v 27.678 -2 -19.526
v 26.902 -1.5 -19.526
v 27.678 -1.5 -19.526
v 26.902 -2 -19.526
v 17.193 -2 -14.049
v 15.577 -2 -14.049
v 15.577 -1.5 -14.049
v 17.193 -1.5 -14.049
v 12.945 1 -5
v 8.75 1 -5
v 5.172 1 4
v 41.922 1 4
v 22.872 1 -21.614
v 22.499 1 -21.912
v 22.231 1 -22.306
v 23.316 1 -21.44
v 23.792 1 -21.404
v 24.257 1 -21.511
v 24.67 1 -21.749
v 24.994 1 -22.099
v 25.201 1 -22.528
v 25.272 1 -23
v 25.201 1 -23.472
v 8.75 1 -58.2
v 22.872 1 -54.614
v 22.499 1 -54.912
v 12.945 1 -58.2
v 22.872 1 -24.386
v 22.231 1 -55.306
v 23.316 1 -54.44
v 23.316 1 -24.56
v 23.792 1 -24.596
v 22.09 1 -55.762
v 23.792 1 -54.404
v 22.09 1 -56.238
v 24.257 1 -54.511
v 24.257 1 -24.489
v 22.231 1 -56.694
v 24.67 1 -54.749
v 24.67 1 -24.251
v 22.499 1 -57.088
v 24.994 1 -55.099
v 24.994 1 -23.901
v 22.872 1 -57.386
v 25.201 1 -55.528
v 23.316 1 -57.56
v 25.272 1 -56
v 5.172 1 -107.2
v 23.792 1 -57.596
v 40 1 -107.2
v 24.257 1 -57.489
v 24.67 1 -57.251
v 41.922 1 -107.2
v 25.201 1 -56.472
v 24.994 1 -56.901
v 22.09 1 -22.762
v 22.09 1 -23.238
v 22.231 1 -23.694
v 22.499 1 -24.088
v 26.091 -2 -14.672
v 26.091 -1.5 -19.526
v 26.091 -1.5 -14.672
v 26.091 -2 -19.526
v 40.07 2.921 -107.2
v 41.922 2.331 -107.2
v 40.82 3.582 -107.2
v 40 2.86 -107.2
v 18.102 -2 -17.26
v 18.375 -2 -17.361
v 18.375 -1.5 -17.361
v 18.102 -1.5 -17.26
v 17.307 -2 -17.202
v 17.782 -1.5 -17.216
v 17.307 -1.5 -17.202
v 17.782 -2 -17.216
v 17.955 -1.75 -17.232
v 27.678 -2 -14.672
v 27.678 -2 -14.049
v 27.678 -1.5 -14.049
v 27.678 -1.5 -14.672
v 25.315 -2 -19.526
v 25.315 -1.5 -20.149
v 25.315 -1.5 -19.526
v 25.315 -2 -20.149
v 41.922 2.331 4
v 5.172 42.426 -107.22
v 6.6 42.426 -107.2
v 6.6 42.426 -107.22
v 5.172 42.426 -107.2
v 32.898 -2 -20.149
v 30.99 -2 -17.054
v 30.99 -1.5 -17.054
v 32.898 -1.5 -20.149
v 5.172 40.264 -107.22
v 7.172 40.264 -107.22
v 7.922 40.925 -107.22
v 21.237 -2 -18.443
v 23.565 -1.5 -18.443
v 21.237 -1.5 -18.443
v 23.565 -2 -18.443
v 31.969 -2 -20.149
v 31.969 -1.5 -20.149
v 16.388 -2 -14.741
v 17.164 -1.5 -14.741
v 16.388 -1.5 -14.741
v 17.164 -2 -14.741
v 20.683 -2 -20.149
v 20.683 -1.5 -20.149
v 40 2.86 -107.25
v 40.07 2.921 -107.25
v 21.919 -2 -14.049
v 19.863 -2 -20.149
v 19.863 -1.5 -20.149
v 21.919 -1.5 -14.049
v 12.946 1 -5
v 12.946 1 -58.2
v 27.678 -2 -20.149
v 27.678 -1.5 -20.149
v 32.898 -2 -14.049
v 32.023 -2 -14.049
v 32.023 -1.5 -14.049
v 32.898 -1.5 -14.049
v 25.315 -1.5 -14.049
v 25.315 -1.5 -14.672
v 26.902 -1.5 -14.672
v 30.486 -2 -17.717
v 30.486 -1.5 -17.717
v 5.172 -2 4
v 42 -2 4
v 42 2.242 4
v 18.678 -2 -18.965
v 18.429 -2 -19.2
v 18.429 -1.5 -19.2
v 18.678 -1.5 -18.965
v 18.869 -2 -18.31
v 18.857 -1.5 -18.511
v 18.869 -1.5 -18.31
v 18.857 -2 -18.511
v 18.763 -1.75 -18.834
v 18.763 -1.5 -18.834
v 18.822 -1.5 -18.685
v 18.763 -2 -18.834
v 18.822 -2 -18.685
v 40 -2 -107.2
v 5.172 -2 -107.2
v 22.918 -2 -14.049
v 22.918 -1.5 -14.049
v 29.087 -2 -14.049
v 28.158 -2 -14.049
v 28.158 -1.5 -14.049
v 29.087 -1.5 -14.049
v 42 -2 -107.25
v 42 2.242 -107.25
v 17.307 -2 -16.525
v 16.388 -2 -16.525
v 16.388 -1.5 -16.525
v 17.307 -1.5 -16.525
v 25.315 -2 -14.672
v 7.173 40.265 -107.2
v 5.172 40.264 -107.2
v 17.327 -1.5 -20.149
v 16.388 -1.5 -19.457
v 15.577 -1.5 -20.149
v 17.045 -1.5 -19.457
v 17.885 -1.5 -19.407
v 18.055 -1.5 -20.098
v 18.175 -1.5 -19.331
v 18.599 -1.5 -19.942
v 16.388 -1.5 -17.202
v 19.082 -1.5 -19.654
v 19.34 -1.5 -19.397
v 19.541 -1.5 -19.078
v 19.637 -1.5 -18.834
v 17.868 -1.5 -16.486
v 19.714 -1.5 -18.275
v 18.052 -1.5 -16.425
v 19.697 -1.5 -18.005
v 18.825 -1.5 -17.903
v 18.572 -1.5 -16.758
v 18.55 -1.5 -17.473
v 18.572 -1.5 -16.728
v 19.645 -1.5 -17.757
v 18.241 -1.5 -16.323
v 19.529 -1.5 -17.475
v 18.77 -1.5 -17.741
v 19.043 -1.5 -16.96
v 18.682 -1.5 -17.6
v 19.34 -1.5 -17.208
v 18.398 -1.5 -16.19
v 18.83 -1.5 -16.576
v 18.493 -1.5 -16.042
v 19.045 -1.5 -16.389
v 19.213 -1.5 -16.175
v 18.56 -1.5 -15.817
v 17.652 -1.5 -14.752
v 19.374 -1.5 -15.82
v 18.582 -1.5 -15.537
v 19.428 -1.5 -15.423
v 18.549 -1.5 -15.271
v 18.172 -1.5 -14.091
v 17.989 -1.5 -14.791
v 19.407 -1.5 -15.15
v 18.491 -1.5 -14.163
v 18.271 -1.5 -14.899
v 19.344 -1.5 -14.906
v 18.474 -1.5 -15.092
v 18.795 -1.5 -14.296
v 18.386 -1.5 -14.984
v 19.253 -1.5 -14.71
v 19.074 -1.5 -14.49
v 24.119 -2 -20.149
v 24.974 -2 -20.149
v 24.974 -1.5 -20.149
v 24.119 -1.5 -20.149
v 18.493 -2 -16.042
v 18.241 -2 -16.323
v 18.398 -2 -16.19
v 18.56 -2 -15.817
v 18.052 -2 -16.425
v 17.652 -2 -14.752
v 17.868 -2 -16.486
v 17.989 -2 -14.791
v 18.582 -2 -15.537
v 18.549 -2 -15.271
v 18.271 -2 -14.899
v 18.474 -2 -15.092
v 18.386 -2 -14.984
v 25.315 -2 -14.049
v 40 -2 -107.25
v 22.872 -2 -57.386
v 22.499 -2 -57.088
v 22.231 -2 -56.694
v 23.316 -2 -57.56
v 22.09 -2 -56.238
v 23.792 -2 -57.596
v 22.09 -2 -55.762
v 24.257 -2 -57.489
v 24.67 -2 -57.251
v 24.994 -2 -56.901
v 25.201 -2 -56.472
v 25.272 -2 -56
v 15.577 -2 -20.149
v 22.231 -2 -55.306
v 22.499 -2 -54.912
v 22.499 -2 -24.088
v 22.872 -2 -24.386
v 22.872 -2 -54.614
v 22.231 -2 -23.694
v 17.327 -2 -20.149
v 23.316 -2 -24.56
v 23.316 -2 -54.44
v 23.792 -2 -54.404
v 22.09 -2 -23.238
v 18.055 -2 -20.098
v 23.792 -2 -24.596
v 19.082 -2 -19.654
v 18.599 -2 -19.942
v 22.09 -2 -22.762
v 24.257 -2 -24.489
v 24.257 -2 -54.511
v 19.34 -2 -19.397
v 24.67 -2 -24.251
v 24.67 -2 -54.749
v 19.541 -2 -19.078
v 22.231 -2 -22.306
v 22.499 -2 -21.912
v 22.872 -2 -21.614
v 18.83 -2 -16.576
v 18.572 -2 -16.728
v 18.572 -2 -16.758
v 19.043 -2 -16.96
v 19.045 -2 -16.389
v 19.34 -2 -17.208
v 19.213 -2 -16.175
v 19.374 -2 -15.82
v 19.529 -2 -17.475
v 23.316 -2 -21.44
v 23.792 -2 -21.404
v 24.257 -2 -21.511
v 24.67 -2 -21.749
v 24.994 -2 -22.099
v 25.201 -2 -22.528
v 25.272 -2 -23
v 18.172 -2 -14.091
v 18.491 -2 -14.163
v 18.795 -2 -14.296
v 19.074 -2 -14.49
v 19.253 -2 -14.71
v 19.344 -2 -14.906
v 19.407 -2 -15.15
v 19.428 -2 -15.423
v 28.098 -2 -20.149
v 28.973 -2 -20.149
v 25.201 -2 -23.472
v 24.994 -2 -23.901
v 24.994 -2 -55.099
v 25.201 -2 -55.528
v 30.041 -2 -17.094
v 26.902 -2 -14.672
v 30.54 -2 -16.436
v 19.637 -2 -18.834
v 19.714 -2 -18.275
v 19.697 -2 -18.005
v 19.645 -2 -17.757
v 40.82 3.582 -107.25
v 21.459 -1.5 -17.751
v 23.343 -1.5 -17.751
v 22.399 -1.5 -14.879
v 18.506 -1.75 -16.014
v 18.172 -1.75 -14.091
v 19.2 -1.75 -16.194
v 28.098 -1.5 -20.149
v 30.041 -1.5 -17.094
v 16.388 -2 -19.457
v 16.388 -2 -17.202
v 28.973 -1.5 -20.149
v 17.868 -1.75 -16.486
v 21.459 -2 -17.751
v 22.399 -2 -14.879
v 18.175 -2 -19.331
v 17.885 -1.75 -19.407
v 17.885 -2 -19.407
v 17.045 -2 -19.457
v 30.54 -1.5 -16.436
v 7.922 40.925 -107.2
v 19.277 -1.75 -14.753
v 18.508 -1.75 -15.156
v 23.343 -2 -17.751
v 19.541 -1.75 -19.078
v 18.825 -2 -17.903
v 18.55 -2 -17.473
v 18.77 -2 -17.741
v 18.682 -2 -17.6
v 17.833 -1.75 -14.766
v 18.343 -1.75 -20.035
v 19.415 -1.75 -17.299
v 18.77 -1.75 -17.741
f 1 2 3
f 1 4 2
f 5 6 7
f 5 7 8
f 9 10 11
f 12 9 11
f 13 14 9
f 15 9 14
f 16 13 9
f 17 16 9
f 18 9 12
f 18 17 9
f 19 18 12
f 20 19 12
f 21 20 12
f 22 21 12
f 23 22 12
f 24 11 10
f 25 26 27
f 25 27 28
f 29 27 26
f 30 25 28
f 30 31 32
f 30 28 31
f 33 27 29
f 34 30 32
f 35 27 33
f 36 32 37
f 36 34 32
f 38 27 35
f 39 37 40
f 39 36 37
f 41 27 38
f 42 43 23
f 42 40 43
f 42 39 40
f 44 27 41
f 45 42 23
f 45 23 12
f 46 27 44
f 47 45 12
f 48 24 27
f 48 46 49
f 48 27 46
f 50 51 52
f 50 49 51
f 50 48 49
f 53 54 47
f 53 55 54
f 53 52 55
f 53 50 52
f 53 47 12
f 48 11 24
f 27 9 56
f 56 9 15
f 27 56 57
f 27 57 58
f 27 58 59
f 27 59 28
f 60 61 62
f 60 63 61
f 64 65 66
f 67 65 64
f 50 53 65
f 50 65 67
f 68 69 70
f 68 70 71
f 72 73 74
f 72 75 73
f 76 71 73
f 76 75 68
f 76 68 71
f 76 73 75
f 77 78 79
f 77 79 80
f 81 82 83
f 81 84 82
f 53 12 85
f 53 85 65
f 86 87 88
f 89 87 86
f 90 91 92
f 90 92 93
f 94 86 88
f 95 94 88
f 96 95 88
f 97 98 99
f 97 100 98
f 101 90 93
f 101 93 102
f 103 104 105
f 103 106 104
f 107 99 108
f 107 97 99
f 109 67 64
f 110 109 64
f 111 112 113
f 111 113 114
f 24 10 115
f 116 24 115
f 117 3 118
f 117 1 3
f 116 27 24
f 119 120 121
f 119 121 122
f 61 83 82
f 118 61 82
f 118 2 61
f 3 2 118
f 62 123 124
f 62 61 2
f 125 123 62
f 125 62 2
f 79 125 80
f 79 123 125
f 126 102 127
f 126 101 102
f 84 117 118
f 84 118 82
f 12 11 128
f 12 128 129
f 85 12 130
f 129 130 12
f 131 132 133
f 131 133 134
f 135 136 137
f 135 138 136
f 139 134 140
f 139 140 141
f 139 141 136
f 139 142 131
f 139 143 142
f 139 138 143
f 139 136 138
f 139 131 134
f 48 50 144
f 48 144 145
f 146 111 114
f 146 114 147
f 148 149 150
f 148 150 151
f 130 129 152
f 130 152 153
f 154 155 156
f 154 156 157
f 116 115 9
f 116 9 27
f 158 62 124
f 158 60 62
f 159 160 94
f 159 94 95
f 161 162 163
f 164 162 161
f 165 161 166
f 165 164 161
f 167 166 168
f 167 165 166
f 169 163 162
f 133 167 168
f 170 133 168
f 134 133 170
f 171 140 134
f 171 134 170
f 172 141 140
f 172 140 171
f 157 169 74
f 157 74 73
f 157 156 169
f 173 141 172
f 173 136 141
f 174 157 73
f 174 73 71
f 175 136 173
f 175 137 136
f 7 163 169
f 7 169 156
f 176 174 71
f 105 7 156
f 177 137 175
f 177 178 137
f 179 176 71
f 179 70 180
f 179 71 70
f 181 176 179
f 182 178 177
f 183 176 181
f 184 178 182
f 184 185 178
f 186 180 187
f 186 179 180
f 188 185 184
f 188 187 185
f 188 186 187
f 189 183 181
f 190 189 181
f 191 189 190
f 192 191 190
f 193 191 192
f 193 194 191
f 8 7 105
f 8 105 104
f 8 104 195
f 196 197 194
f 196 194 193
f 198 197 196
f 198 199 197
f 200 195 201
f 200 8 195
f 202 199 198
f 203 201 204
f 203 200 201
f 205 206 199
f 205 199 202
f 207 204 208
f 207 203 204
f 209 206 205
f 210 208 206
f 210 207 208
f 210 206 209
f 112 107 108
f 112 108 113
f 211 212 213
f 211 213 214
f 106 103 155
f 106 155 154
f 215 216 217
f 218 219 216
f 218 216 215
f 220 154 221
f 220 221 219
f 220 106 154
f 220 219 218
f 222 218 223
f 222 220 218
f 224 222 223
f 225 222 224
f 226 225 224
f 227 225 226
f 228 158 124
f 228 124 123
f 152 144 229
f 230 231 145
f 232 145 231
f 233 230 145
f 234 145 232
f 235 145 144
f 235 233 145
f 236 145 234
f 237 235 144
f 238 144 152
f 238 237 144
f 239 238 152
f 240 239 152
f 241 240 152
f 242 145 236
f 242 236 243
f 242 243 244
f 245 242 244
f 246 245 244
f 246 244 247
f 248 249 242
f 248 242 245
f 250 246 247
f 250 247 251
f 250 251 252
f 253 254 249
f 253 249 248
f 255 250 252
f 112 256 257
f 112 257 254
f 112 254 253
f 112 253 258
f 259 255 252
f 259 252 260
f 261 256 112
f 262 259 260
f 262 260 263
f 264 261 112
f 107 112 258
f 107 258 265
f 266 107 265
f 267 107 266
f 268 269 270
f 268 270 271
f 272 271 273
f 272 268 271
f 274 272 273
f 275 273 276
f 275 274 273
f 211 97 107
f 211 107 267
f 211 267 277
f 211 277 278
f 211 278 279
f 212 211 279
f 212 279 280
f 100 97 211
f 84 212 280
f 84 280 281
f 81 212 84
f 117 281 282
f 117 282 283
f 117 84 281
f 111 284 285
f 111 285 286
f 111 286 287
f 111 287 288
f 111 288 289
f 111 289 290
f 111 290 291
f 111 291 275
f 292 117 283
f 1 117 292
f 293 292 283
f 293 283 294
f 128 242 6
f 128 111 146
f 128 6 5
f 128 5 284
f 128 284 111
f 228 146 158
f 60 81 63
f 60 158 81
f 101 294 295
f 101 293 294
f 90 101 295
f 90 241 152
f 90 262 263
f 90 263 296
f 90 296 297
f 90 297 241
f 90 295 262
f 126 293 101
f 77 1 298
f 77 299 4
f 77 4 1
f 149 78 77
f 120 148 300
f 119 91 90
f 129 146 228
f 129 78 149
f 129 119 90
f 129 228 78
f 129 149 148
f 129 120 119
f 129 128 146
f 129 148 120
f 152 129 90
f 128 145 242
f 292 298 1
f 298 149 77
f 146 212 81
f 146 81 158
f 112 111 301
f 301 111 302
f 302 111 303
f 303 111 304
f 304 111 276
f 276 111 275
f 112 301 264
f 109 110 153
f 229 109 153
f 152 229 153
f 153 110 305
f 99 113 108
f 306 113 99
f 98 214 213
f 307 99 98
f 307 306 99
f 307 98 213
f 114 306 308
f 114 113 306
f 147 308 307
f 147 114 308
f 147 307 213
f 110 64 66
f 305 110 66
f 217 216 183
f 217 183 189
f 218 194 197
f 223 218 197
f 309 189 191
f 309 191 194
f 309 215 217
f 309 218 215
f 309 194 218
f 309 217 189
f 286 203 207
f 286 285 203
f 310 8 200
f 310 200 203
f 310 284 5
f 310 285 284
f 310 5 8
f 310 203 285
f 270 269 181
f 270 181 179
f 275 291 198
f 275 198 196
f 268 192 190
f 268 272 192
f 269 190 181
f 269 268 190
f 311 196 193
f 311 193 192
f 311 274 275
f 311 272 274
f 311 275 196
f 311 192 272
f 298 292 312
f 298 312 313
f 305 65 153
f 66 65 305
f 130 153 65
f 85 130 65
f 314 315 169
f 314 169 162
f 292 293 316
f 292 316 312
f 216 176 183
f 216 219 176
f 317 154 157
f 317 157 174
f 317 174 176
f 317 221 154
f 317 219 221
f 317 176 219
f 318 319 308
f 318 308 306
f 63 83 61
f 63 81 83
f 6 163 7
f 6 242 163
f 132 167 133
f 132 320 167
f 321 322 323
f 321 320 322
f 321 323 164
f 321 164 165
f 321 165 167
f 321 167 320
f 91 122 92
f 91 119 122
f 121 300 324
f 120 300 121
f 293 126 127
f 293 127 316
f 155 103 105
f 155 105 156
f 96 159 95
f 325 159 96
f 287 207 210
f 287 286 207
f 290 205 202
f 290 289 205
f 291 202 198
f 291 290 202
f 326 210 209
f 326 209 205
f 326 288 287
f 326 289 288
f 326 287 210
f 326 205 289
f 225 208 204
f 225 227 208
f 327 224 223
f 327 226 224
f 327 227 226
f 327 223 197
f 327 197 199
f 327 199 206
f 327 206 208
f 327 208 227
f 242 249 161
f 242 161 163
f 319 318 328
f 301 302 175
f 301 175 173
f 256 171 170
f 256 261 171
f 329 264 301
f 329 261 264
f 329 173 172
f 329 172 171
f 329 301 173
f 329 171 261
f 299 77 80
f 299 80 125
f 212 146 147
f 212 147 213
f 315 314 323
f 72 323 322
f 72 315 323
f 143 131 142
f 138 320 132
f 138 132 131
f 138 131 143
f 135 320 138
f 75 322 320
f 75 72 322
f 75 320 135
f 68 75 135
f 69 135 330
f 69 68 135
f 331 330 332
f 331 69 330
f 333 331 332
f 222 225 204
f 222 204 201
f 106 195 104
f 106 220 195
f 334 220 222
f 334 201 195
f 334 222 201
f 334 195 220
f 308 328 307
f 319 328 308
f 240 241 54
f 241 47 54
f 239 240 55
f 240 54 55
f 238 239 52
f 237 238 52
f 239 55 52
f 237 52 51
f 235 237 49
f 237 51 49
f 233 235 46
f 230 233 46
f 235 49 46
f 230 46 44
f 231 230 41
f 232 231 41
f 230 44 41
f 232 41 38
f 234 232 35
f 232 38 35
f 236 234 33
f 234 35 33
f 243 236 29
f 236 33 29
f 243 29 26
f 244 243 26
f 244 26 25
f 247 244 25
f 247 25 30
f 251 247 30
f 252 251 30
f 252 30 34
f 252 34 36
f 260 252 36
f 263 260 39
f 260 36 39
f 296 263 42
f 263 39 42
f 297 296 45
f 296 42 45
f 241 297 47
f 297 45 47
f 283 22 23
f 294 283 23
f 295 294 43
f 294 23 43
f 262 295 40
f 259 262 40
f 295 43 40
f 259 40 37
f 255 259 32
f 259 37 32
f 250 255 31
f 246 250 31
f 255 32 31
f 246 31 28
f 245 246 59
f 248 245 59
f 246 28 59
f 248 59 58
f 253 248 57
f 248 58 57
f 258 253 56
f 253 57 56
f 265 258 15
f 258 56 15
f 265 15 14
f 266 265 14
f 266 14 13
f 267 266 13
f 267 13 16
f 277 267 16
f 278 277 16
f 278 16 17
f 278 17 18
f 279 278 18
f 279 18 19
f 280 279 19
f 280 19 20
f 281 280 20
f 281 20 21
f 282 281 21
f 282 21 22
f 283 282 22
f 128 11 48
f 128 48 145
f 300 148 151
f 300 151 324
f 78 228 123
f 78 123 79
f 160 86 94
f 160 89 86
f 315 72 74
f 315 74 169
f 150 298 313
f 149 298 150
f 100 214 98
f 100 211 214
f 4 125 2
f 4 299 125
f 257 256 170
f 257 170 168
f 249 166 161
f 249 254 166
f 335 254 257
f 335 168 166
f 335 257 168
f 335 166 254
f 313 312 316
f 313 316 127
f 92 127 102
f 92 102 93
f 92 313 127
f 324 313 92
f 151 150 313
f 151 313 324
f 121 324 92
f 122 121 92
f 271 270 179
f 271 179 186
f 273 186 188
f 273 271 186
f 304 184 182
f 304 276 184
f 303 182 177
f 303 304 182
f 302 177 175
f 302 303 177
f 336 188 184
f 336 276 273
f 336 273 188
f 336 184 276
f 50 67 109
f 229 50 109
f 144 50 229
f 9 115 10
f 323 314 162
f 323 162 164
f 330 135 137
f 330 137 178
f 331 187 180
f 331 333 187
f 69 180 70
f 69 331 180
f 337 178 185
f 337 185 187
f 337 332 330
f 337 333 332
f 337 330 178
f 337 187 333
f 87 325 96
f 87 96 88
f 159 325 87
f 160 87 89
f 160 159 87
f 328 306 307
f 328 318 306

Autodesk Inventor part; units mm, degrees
ref_plane "YZ Plane" through (0, 0, 0) normal (1, 0, 0) x (0, 1, 0)
ref_plane "XZ Plane" through (0, 0, 0) normal (0, 1, 0) x (-1, 0, 0)
ref_plane "XY Plane" through (0, 0, 0) normal (0, 0, 1) x (1, 0, 0)
sketch "Boceto3" plane through (0, 0, 0) normal (0, 0, 1) x (1, 0, 0)
  line L0 (40, 0) -> (37, 0)
  line L1 (0, 0) -> (0, 45)
  line L2 (0, 45) -> (3, 45)
  line L3 (40, 0) -> (40, 3)
  line L4 (40, 3) -> (3, 45)
  line L5 (0, 0) -> (40, 0)
  dimension "d3" = 3
  dimension "d4" = 45
  dimension "d5" = 3
  dimension "d6" = 3
extrude "Extrusión1" add sketch "Boceto3" against normal blind 98.2
sketch "Boceto4" plane through (0, 0, 0) normal (0, 0, 1) x (1, 0, 0)
  line L0 (3.3154, 41.6201) -> (2, 43)
  line L1 (3.3154, 41.6201) -> (38, 2)
  line L2 (38, 2) -> (2, 2)
  line L3 (2, 2) -> (2, 43)
  point P0 (0, 45)
extrude "Extrusión2" cut sketch "Boceto4" against normal blind 210.55
sketch "Boceto6" plane through (0, 0, 0) normal (0, 0, 1) x (1, 0, 0)
  line L0 (1.0395, 0.9992) -> (39.0395, 0.9992)
  line L1 (39.0395, 1.0003) -> (39.0395, 1.9993) projected
  line L2 (39.0395, 0.9992) -> (39.0395, 1.9993)
  line L3 (39.0395, 1.9993) -> (3, 44.0003)
  line L4 (2.88, 44.0003) -> (1, 44.0003) projected
  line L5 (3, 44.0003) -> (1, 44.0003)
  line L6 (1, 1.0003) -> (39.0395, 1.0003) projected
  line L7 (1, 44.0003) -> (1, 1.0003)
  point P0 (0, 0)
extrude "Extrusión3" add sketch "Boceto6" against normal blind 2
sketch "Boceto7" plane through (0, 0, -98.2) normal (0, 0, -1) x (-1, 0, 0)
  line L0 (-1, 1.0003) -> (-39.0395, 1.0003) projected
  line L1 (-1, 1.0003) -> (-39.0395, 1.0003)
  line L2 (-39.0395, 1.0003) -> (-39.0395, 2)
  line L3 (-39.0395, 1.9993) -> (-2.88, 44.0003) projected
  line L4 (-39.0395, 2) -> (-2.88, 44.0003)
  line L5 (-2.88, 44.0003) -> (-1, 44.0003) projected
  line L6 (-1, 44.0003) -> (-1, 1.0003)
  line L7 (-2.88, 44.0003) -> (6.9067, 55.3678)
  line L8 (6.9067, 55.3678) -> (10.1689, 59.157)
  line L9 (10.1689, 59.157) -> (10.1689, 0)
  line L10 (10.1689, 0) -> (0, 0)
  dimension "d68" = 15
  dimension "d70" = 5
extrude "Extrusión4" add sketch "Boceto7" against normal blind 2
sketch "Boceto10" plane through (0, 0, -96.2) normal (0, 0, 1) x (1, 0, 0)
  line L0 (20.1691, 1.0003) -> (21.6691, 1.0003)
  line L1 (39.0395, 1.0003) -> (1, 1.0003) projected
  line L2 (21.6691, 1.0003) -> (21.6691, 22.1759)
  line L3 (2.88, 44.0003) -> (39.0395, 1.9993) projected
  line L4 (21.6691, 22.1759) -> (20.1691, 23.9182)
  line L5 (20.1691, 23.9182) -> (20.1691, 1.0003)
  point P0 (0, 0)
  dimension "d49" = 1.5
extrude "Extrusión7" add sketch "Boceto10" along normal blind 96
sketch "Boceto15" plane through (0, 0, -98.2) normal (0, 0, -1) x (-1, 0, 0)
  line L0 (-3, 45) -> (-40, 3) projected
  line L1 (-20.3927, 25.257) -> (-7.1721, 40.2641)
  line L2 (-7.1721, 40.2641) -> (-7.1721, 0)
  line L3 (-20.1691, 1.0003) -> (-1, 1.0003) projected
  line L4 (-7.1721, 40.2641) -> (-3, 45)
  line L5 (0, 45) -> (-3, 45)
  line L6 (0, 0) -> (0, 45) projected
  line L7 (0, 45) -> (0, 0)
  line L8 (0, 0) -> (-7.1721, 0)
  line L9 (-40, 0) -> (0, 0) projected
  dimension "d71" = 20
extrude "Extrusión9" cut sketch "Boceto15" against normal blind 617.4
sketch "Boceto16" plane through (0, 0, -96.2) normal (0, 0, 1) x (1, 0, 0)
  line L0 (7.1721, 1) -> (8.6721, 1.0003)
  line L1 (20.1691, 1.0003) -> (7.1721, 1.0003) projected
  line L2 (8.6721, 1.0003) -> (8.6721, 37.2725)
  line L3 (7.1721, 39.0149) -> (20.1691, 23.9182) projected
  line L4 (8.6721, 37.2725) -> (7.1721, 39.0149)
  line L5 (7.1721, 39.0149) -> (7.1721, 1)
  point P0 (0, 0)
  dimension "d74" = 1.5
extrude "Extrusión10" add sketch "Boceto16" along normal blind 95.4
sketch "Boceto17" plane through (0, 0, 0) normal (0, 0, 1) x (1, 0, 0)
  line L0 (20.1691, 1.0003) -> (8.6721, 1.0003) projected
  line L1 (8.6721, 35.5011) -> (8.6721, 2) projected
  line L2 (8.6721, 1.0003) -> (8.6721, 37.2725)
  line L3 (39.0395, 1.9993) -> (21.6691, 22.1759) projected
  line L4 (8.6721, 37.2725) -> (39.0395, 1.9993)
  line L5 (39.0395, 1.9993) -> (39.0395, 1.0003)
  line L6 (39.0395, 1.0003) -> (8.6721, 1.0003)
  line L7 (40, 0) -> (7.1721, 0) projected
  point P0 (0, 0)
extrude "Extrusión11" cut sketch "Boceto17" against normal blind 235.6
sketch "Boceto21" plane through (40, 3, 0) normal (0.7504, 0.661, 0) x (0, 0, -1)
  line L0 (5, 24.1901) -> (5, 36.1901)
  line L1 (5, 36.1901) -> (5, 12.1901)
  line L2 (76, 36.1901) -> (5, 36.1901)
  line L3 (85, 24.1901) -> (85, 18.1901)
  line L4 (85, 18.1901) -> (91, 18.1901)
  line L5 (91, 18.1901) -> (97, 18.1901)
  line L6 (97, 18.1901) -> (97, 30.1901)
  line L7 (97, 30.1901) -> (85, 30.1901)
  line L8 (85, 30.1901) -> (85, 24.1901)
  line L9 (76, 24.1901) -> (81, 24.1901)
  line L10 (81, 24.1901) -> (85, 24.1901)
  line L11 (76, 36.1901) -> (77, 36.1901)
  line L12 (77, 36.1901) -> (77, 12.1901)
  line L13 (77, 12.1901) -> (76, 12.1901)
  line L14 (77, 12.1901) -> (77, 11.1901)
  line L15 (77, 11.1901) -> (5, 11.1901)
  line L16 (5, 11.1901) -> (5, 12.1901)
  point P0 (0, 24.1901)
  dimension "d114" = 5
  dimension "d176" = 1
  dimension "d177" = 1
extrude "Extrusión13" cut sketch "Boceto21" against normal blind 1.5
sketch "Boceto22" plane through (0, 0, 0) normal (0, 0, 1) x (1, 0, 0)
  line L0 (8.6721, 1.0003) -> (39.0395, 1.0003) projected
  line L1 (8.6721, 1.0003) -> (39.0395, 1.0003)
  line L2 (39.0395, 1.0003) -> (39.0395, 2)
  line L3 (39.0395, 2) -> (8.6721, 37)
  line L4 (8.6721, 37.2725) -> (8.6721, 1.0003) projected
  line L5 (8.6721, 37) -> (8.6721, 1.0003)
  line L6 (7.1721, 0) -> (7.1721, 40.2641) projected
  line L7 (7.1721, 40.2641) -> (7.1721, 0)
  line L8 (40, 3) -> (40, 0) projected
  line L9 (7.1721, 0) -> (40, 0)
  line L10 (40, 0) -> (40, 3)
  line L11 (40, 3) -> (7.1721, 40.2641)
  line L12 (7.1721, 40.2641) -> (40, 3) projected
  point P0 (0, 0)
extrude "Extrusión14" add sketch "Boceto22" along normal blind 2
sketch "Boceto24" plane through (0, 0, 2) normal (0, 0, 1) x (1, 0, 0)
  line L0 (8.6721, 1.0003) -> (8.6721, 37) projected
  line L1 (39.0395, 1.0003) -> (8.6721, 1.0003) projected
  line L2 (8.6721, 1.0003) -> (39.0395, 1.0003)
  line L3 (39.0395, 1.0003) -> (39.0395, 2)
  line L4 (39.0395, 2) -> (8.6721, 37)
  line L5 (8.6721, 37) -> (8.6721, 1.0003)
  point P0 (0, 0)
extrude "Extrusión15" add sketch "Boceto24" against normal blind 2
sketch "Boceto25" plane through (0, 0, -98.2) normal (0, 0, -1) x (-1, 0, 0)
  line L0 (-8.6721, 1.0003) -> (-8.6721, 37.2725) projected
  line L1 (-8.6721, 1.0003) -> (-8.6721, 37.2725)
  line L2 (-8.6721, 37.2725) -> (-39, 2)
  line L3 (-39, 2) -> (-39, 1.0003)
  line L4 (-39, 1.0003) -> (-8.6721, 1.0003)
  line L5 (-7.1721, 0) -> (-40, 0) projected
  line L6 (-7.1721, 40) -> (-7.1721, 0)
  line L7 (-40, 0) -> (-7.1721, 0)
  line L8 (-40, 0) -> (-40, 2.8598)
  line L9 (-7.1721, 0) -> (-7.1721, 40.2641) projected
  line L10 (-40, 2.8598) -> (-7.1721, 40.2641)
  point P0 (0, 0)
extrude "Extrusión16" add sketch "Boceto25" along normal blind 7
sketch "Boceto27" plane through (0, 0, -105.2) normal (0, 0, -1) x (-1, 0, 0)
  line L0 (-8.6721, 1.0003) -> (-39.0395, 1.0003) projected
  line L1 (-8.6721, 1.0003) -> (-39.0395, 1.0003)
  line L2 (-39.0395, 1.0003) -> (-39.0395, 1.9993)
  line L3 (-8.6721, 1.0003) -> (-8.6721, 37.2725) projected
  line L4 (-39.0395, 1.9993) -> (-8.6721, 37.2725)
  line L5 (-8.6721, 37.2725) -> (-8.6721, 1.0003)
  point P0 (0, 0)
extrude "Extrusión17" add sketch "Boceto27" against normal blind 2
sketch "Boceto28" plane through (7.1721, 0, 2) normal (0, -1, 0) x (1, 0, 0)
  line L0 (0, 0) -> (0, -107.2) projected
  line L1 (32.8279, 0) -> (32.8279, -107.2) projected
  line L2 (0, 0) -> (32.8279, 0)
  line L3 (32.8279, 0) -> (32.8279, -107.2)
  line L4 (32.8279, -107.2) -> (0, -107.2)
  line L5 (0, -107.2) -> (0, 0)
  point P0 (-7.1721, -2)
extrude "Extrusión18" add sketch "Boceto28" along normal blind 2
sketch "Boceto29" plane through (7.1721, 40.2641, -98.2) normal (-1, 0, 0) x (0, 0, 1)
  line L0 (0, 0) -> (-7, 0) projected
  line L1 (100.2, -37.2641) -> (100.2, -42.2641) projected
  line L2 (-7, 0) -> (100.2, 0)
  line L3 (100.2, 0) -> (100.2, -42.2641)
  line L4 (100.2, -42.2641) -> (-7, -42.2641)
  line L5 (-7, -42.2641) -> (-7, 0)
  point P0 (98.2, -40.2641)
extrude "Extrusión19" add sketch "Boceto29" along normal blind 2
sketch "Boceto30" plane through (0, 0, -105.2) normal (0, 0, -1) x (-1, 0, 0)
  line L0 (-7.1721, 40.2641) -> (-5.1721, 40.2641)
  line L1 (-5.1721, 40.2641) -> (-5.1721, -2) projected
  line L2 (-5.1721, 40.2641) -> (-5.1721, -2)
  line L3 (-40, -2) -> (-5.1721, -2) projected
  line L4 (-5.1721, -2) -> (-40, -2)
  line L5 (-40, 2.8598) -> (-40, -2) projected
  line L6 (-40, -2) -> (-40, 2.8598)
  line L7 (-40, 2.8598) -> (-7.1721, 40.2641)
  line L8 (-7.1721, 40.2641) -> (-5.1721, 40.2641)
  point P0 (0, 0)
extrude "Extrusión20" add sketch "Boceto30" along normal blind 2
sketch "Boceto31" plane through (0, 0, 2) normal (0, 0, 1) x (1, 0, 0)
  line L0 (5.1721, -2) -> (5.1721, 40.2641) projected
  line L1 (5.1721, 40.2643) -> (5.1721, -2)
  line L2 (40, -2) -> (5.1721, -2) projected
  line L3 (5.1721, -2) -> (40, -2)
  line L4 (40, 2.8598) -> (40, -2) projected
  line L5 (40, -2) -> (40, 2.8598)
  line L6 (40, 2.8598) -> (7.1721, 40.2641) projected
  line L7 (7.1721, 40.2641) -> (40, 2.8598)
  line L8 (7.1721, 40.2641) -> (5.1721, 40.2641)
  point P0 (0, 0)
extrude "Extrusión21" add sketch "Boceto31" along normal blind 2
sketch "Boceto32" plane through (40, 3, 2) normal (0.7504, 0.661, 0) x (0, 0, -1)
  line L0 (-2, 49.6617) -> (-2, 0)
  line L1 (-2, 0) -> (109.2, 0)
  line L2 (109.2, -3.7518) -> (109.2, 19.2705) projected
  line L3 (100.2, -0.1052) -> (109.2, -0.1052) projected
  line L4 (109.2, 49.6617) -> (109.2, -0.1052)
  line L5 (109.2, 49.6617) -> (-2, 49.6617)
  line L6 (-2, 50.9838) -> (-2, 19.2705) projected
  line L7 (7, 11.1901) -> (7, 36.1901) projected
  line L8 (7, 36.1901) -> (7, 12.1901)
  line L9 (78, 36.1901) -> (7, 36.1901)
  line L10 (87, 30.1901) -> (99, 30.1901) projected
  line L11 (87, 18.1901) -> (87, 30.1901) projected
  line L12 (87, 30.1901) -> (87, 18.1901)
  line L13 (99, 30.1901) -> (99, 18.1901) projected
  line L14 (87, 18.1901) -> (99, 18.1901)
  line L15 (99, 18.1901) -> (99, 30.1901)
  line L16 (100.2, 49.6617) -> (109.2, 49.6617) projected
  line L17 (109.2, 49.6617) -> (109.2, -0.1052)
  line L18 (-2, -3.7518) -> (-2, -0.1052) projected
  line L19 (109.2, -0.1052) -> (-2, -0.1052)
  line L20 (-2, -0.1052) -> (-2, 49.6617)
  line L21 (109.2, 49.6617) -> (-2, 49.6617)
  line L22 (87, 30.1901) -> (99, 30.1901)
  line L23 (7, 12.1901) -> (7, 11.1901)
  line L24 (7, 11.1901) -> (79, 11.1901)
  line L25 (79, 11.1901) -> (79, 36.1901)
  line L26 (79, 36.1901) -> (78, 36.1901)
  point P0 (2, 24.1901)
  dimension "d174" = 1
  dimension "d175" = 72
extrude "Extrusión22" add sketch "Boceto32" along normal blind 1
sketch "Boceto33" plane through (40.7504, 3.661, 2) normal (0.7504, 0.661, 0) x (0, 0, -1)
  line L0 (87, 30.1901) -> (87, 18.1901) projected
  line L1 (87, 30.1901) -> (99, 30.1901) projected
  line L2 (87, 30.1901) -> (99, 30.1901)
  line L3 (99, 30.1901) -> (99, 18.1338)
  line L4 (100.2, -0.1052) -> (100.2, 49.6617) projected
  line L5 (99, 18.1338) -> (87, 18.1338)
  line L6 (87, 30.1901) -> (87, 34.1901)
  line L7 (87, 34.1901) -> (83, 34.1901)
  line L8 (99, 18.1901) -> (99, 14.1901)
  line L9 (99, 14.1901) -> (103, 14.1901)
  line L10 (83, 34.1901) -> (103, 34.1901)
  line L11 (103, 34.1901) -> (103, 14.1901)
  line L12 (103, 14.1901) -> (83, 14.1901)
  line L13 (83, 14.1901) -> (83, 34.1901)
  point P0 (2, 24.1901)
  dimension "d126" = 4
  dimension "d127" = 4
  dimension "d129" = 4
  dimension "d130" = 4
extrude "Extrusión23" add sketch "Boceto33" against normal blind 2.5
sketch "Boceto34" plane through (40.7504, 3.661, 2) normal (0.7504, 0.661, 0) x (0, 0, -1)
  line L0 (99, 18.1901) -> (99, 30.1901)
  line L1 (99, 18.1901) -> (87, 18.1901)
  line L2 (87, 18.1901) -> (87, 30.1901)
  line L3 (99, 30.1901) -> (99, 18.1901)
  line L4 (99, 30.1901) -> (99, 18.1901)
  line L5 (87, 18.1901) -> (99, 18.1901)
  line L6 (99, 30.1901) -> (99, 31.1901)
  line L7 (99, 31.1901) -> (87, 31.1901)
  line L8 (87, 31.1901) -> (87, 30.1901)
  point P0 (2, 24.1901)
  point P1 (83, 34.1901)
  dimension "d173" = 1
extrude "Extrusión24" cut sketch "Boceto34" against normal blind 6
sketch "Boceto35" plane through (40.0695, 2.9211, 4) normal (0, 0, 1) x (0.7504, 0.661, 0)
  line L0 (0, 49.7669) -> (1, 49.7669) projected
  line L1 (1, 49.7669) -> (0, 49.7669)
  line L2 (0, 49.7669) -> (0, 0)
  line L3 (0, 0) -> (1, 0) projected
  line L4 (0, 0) -> (1, 0)
  line L5 (1, 0) -> (1, 49.7669)
  point P0 (-31.9975, 24.2953)
extrude "Extrusión25" cut sketch "Boceto35" against normal blind 0.0001
sketch "Boceto36" plane through (0, 0, 4) normal (0, 0, 1) x (1, 0, 0)
  line L0 (5.1721, 40.2641) -> (7.1721, 40.2641) projected
  line L1 (7.1721, 40.2641) -> (40, 2.8598) projected
  line L2 (5.1721, 40.2641) -> (7.1721, 40.2641)
  line L3 (7.1721, 40.2641) -> (7.9224, 40.9252) projected
  line L4 (7.1721, 40.2641) -> (7.9224, 40.9252)
  line L5 (7.9224, 40.9252) -> (6.6004, 42.4259)
  line L6 (6.6004, 42.4259) -> (5.1721, 42.4259)
  line L7 (5.1721, -2) -> (5.1721, 40.2641) projected
  line L8 (5.1721, 42.4259) -> (5.1721, 40.2641)
  point P0 (0, 0)
  dimension "d140" = 2
extrude "Extrusión26" add sketch "Boceto36" against normal blind 111.22
sketch "Boceto37" plane through (0, 0, 4) normal (0, 0, 1) x (1, 0, 0)
  line L0 (40.0695, 2.9211) -> (7.1721, 40.2641) projected
  line L1 (40.0695, 2.9211) -> (39.9946, 2.8551)
  line L2 (39.9946, 2.8551) -> (7.1346, 40.2311)
  line L3 (7.1721, 40.2641) -> (7.9224, 40.9252) projected
  line L4 (7.1346, 40.2311) -> (7.9224, 40.9252)
  line L5 (7.9224, 40.9252) -> (40.0695, 2.9211)
  point P0 (0, 0)
extrude "Extrusión27" add sketch "Boceto37" against normal blind 2 contours L1 L2 L4 L0
sketch "Boceto38" plane through (0, 0, 4) normal (0, 0, 1) x (1, 0, 0)
  line L0 (40, 2.8598) -> (40, -2) projected
  line L1 (40, -2) -> (40, 2.8598)
  line L2 (40.0695, 2.9211) -> (40.8199, 3.5821) projected
  line L3 (40, 2.8598) -> (40.8199, 3.5821)
  line L4 (40, -2) -> (42, -2)
  line L5 (42, -2) -> (42, 2.2425)
  line L6 (42, 2.2425) -> (40.8199, 3.5821)
  point P0 (0, 0)
extrude "Extrusión28" add sketch "Boceto38" against normal blind 111.25
sketch "Boceto39" plane through (0, 0, -107.2) normal (0, 0, -1) x (-1, 0, 0)
  line L0 (-40.0695, 2.9211) -> (-40.8199, 3.5821) projected
  line L1 (-40.0695, 2.9211) -> (-40, 2.8598)
  line L2 (-40.0695, 2.9211) -> (-7.1721, 40.2641) projected
  line L3 (-40, 2.8598) -> (-7.1721, 40.2641)
  line L4 (-7.1721, 40.2641) -> (-40.0695, 2.9211)
  line L5 (-40.0695, 2.9211) -> (-40, 2.8598)
  point P0 (0, 0)
extrude "Extrusión29" add sketch "Boceto39" against normal blind 2
sketch "Boceto40" plane through (7.1721, -2, 2) normal (0, -1, 0) x (1, 0, 0)
  line L0 (7.7868, -16.0487) -> (16.7678, -16.0487) construction
  line L1 (16.7678, -16.0487) -> (16.7678, -19.0967) construction
  line L2 (16.7678, -19.0967) -> (7.7868, -19.0967) construction
  line L3 (7.7868, -19.0967) -> (7.7868, -16.0487) construction
  spline S0 degree 2 poles (12.5423, -20.2752) (12.5423, -20.73) (12.1962, -21.427) (11.9095, -21.6544) knots 0 0 0 1 2 2 2
  spline S1 degree 2 poles (11.9095, -21.6544) (11.5635, -21.9213) (10.7775, -22.1487) (10.1547, -22.1487) knots 0 0 0 1 2 2 2
  line L4 (10.1547, -22.1487) -> (8.4047, -22.1487)
  line L5 (8.4047, -22.1487) -> (8.4047, -16.0487)
  line L6 (8.4047, -16.0487) -> (10.0212, -16.0487)
  spline S2 degree 2 poles (10.0212, -16.0487) (10.6737, -16.0487) (11.3262, -16.1327) (11.6228, -16.2959) knots 0 0 0 1 2 2 2
  spline S3 degree 2 poles (11.6228, -16.2959) (11.954, -16.4689) (12.2556, -17.0374) (12.2556, -17.4229) knots 0 0 0 1 2 2 2
  spline S4 degree 2 poles (12.2556, -17.4229) (12.2556, -17.853) (11.8008, -18.5352) (11.4004, -18.728) knots 0 0 0 1 2 2 2
  line L7 (11.4004, -18.728) -> (11.4004, -18.7576)
  spline S5 degree 2 poles (11.4004, -18.7576) (11.9441, -18.9059) (12.5423, -19.6919) (12.5423, -20.2752) knots 0 0 0 1 2 2 2
  spline S6 degree 2 poles (11.697, -20.3098) (11.697, -19.9638) (11.4992, -19.5189) (11.2026, -19.3607) knots 0 0 0 1 2 2 2
  spline S7 degree 2 poles (11.2026, -19.3607) (11.0099, -19.2618) (10.5551, -19.2025) (10.1349, -19.2025) knots 0 0 0 1 2 2 2
  line L8 (10.1349, -19.2025) -> (9.2154, -19.2025)
  line L9 (9.2154, -19.2025) -> (9.2154, -21.4566)
  line L10 (9.2154, -21.4566) -> (9.8729, -21.4566)
  spline S8 degree 2 poles (9.8729, -21.4566) (10.4068, -21.4566) (11.0197, -21.3578) (11.257, -21.1996) knots 0 0 0 1 2 2 2
  spline S9 degree 2 poles (11.257, -21.1996) (11.4844, -21.0365) (11.697, -20.6311) (11.697, -20.3098) knots 0 0 0 1 2 2 2
  spline S10 degree 2 poles (11.4103, -17.5366) (11.4103, -17.3191) (11.262, -16.9929) (11.0988, -16.8989) knots 0 0 0 1 2 2 2
  spline S11 degree 2 poles (11.0988, -16.8989) (10.9011, -16.7902) (10.4216, -16.7408) (9.9915, -16.7408) knots 0 0 0 1 2 2 2
  line L11 (9.9915, -16.7408) -> (9.2154, -16.7408)
  line L12 (9.2154, -16.7408) -> (9.2154, -18.5253)
  line L13 (9.2154, -18.5253) -> (10.1349, -18.5253)
  spline S12 degree 2 poles (10.1349, -18.5253) (10.5155, -18.5253) (10.8764, -18.4462) (11.0692, -18.3226) knots 0 0 0 1 2 2 2
  spline S13 degree 2 poles (11.0692, -18.3226) (11.257, -18.204) (11.4103, -17.8233) (11.4103, -17.5366) knots 0 0 0 1 2 2 2
  line L14 (12.6906, -22.1487) -> (14.747, -16.0487)
  line L15 (14.747, -16.0487) -> (15.7455, -16.0487)
  line L16 (15.7455, -16.0487) -> (17.8019, -22.1487)
  line L17 (17.8019, -22.1487) -> (16.9467, -22.1487)
  line L18 (16.9467, -22.1487) -> (16.3931, -20.4433)
  line L19 (16.3931, -20.4433) -> (14.0648, -20.4433)
  line L20 (14.0648, -20.4433) -> (13.5111, -22.1487)
  line L21 (13.5111, -22.1487) -> (12.6906, -22.1487)
  line L22 (16.1706, -19.7512) -> (15.2265, -16.8792)
  line L23 (15.2265, -16.8792) -> (14.2872, -19.7512)
  line L24 (14.2872, -19.7512) -> (16.1706, -19.7512)
  line L25 (20.5059, -22.1487) -> (18.143, -22.1487)
  line L26 (18.143, -22.1487) -> (18.143, -21.5258)
  line L27 (18.143, -21.5258) -> (18.9191, -21.5258)
  line L28 (18.9191, -21.5258) -> (18.9191, -16.6716)
  line L29 (18.9191, -16.6716) -> (18.143, -16.6716)
  line L30 (18.143, -16.6716) -> (18.143, -16.0487)
  line L31 (18.143, -16.0487) -> (20.5059, -16.0487)
  line L32 (20.5059, -16.0487) -> (20.5059, -16.6716)
  line L33 (20.5059, -16.6716) -> (19.7298, -16.6716)
  line L34 (19.7298, -16.6716) -> (19.7298, -21.5258)
  line L35 (19.7298, -21.5258) -> (20.5059, -21.5258)
  line L36 (20.5059, -21.5258) -> (20.5059, -22.1487)
  line L37 (25.726, -22.1487) -> (24.7966, -22.1487)
  line L38 (24.7966, -22.1487) -> (23.3137, -19.7166)
  line L39 (23.3137, -19.7166) -> (21.801, -22.1487)
  line L40 (21.801, -22.1487) -> (20.9261, -22.1487)
  line L41 (20.9261, -22.1487) -> (22.8688, -19.0938)
  line L42 (22.8688, -19.0938) -> (20.9854, -16.0487)
  line L43 (20.9854, -16.0487) -> (21.9147, -16.0487)
  line L44 (21.9147, -16.0487) -> (23.368, -18.4363)
  line L45 (23.368, -18.4363) -> (24.851, -16.0487)
  line L46 (24.851, -16.0487) -> (25.726, -16.0487)
  line L47 (25.726, -16.0487) -> (23.8179, -19.0542)
  line L48 (23.8179, -19.0542) -> (25.726, -22.1487)
  point P0 (-7.1721, -2)
extrude "Extrusión30" cut sketch "Boceto40" against normal blind 0.5
sketch "Boceto41" plane through (8.6721, 1.0003, 0) normal (0, 1, 0) x (1, 0, 0)
  circle A0 centre (15, 56) radius 1.6
  circle A1 centre (15, 23) radius 1.6
  point P0 (-8.6721, 0)
  dimension "d155" = 3.2
  dimension "d156" = 3.2
extrude "Extrusión31" cut sketch "Boceto41" against normal blind 65.25
sketch "Boceto42" plane through (5.1721, 40.2641, -98.2) normal (-1, 0, 0) x (0, 0, 1)
  line L0 (9.7, -39.2638) -> (9.7, -34.2638)
  line L1 (9.7, -34.2638) -> (24.7, -34.2638)
  line L2 (24.7, -34.2638) -> (24.7, -39.2638)
  line L3 (9.7, -39.2638) -> (24.7, -39.2638)
  line L4 (0, -39.2638) -> (98.2, -39.2638) projected
  point P0 (98.2, -40.2641)
  point P1 (17.2, -27.608)
extrude "Extrusión32" cut sketch "Boceto42" against normal blind 6.25
sketch "Boceto43" plane through (5.1721, 40.2641, -98.2) normal (-1, 0, 0) x (0, 0, 1)
  line L0 (21.2, -10.7488) -> (93.2, -10.7488) projected
  line L1 (93.2, -10.7488) -> (40, -10.7488)
  line L2 (40, -10.7488) -> (40, -15.7488)
  line L3 (40, -15.7488) -> (93.2, -15.7488)
  line L4 (93.2, -15.7488) -> (93.2, -10.7488)
  line L5 (93.2, -35) -> (40, -35)
  line L6 (40, -35) -> (40, -30)
  line L7 (40, -30) -> (93.2, -30)
  line L8 (93.2, -30) -> (93.2, -35)
  line L9 (103, -15.7488) -> (118.5563, -15.7488) construction
  point P0 (98.2, -40.2641)
  point P1 (22.2, -10.7488)
  dimension "d164" = 5
  dimension "d165" = 5
sketch "Boceto44" plane through (0, 0, 4) normal (0, 0, 1) x (1, 0, 0)
  line L0 (5.1721, -2) -> (5.1721, 40.2641) projected
  line L1 (5.1721, 19.1321) -> (16, 6.2278)
  line L2 (5.1721, 19.1321) -> (22.0173, 19.1321) construction
  point P0 (0, 0)
  dimension "d167" = 50
sweep "Barrido1" cut profiles "Boceto43" path "Boceto44" path curves L1
sketch "Boceto45" plane through (7.1721, -2, 2) normal (0, -1, 0) x (1, 0, 0)
  line L0 (4.0953, -60.2) -> (8.2908, -60.2)
  line L1 (8.2908, -7) -> (4.0953, -7)
  line L2 (8.2908, -7) -> (0, -7)
  line L3 (0, -7) -> (0, -60.2)
  line L4 (0, -60.2) -> (8.2908, -60.2)
  line L5 (8.2908, -60.2) -> (8.2908, -7)
  point P0 (-7.1721, -2)
extrude "Extrusión33" add sketch "Boceto45" against normal blind 3
ref_plane "Plano de trabajo3" through (6.9221, 1.0003, -88.5) normal (0, 1, 0) x (1, 0, 0)
sketch "Boceto47" plane through (6.9221, 1.0003, -88.5) normal (0, 1, 0) x (1, 0, 0)
  line L0 (-1.75, -92.5) -> (-1.75, 18.7) projected
  line L1 (-1.75, -92.5) -> (35, -92.5)
  line L2 (35, -92.5) -> (35, 18.7)
  line L3 (35, 18.7) -> (-1.75, 18.7)
  line L4 (-1.75, 18.7) -> (-1.75, -92.5)
  point P0 (-6.9221, -88.5)
extrude "Extrusión34" cut sketch "Boceto47" along normal blind 79.25
properties part number "Suport - pantalla i potenciometre tapa"
